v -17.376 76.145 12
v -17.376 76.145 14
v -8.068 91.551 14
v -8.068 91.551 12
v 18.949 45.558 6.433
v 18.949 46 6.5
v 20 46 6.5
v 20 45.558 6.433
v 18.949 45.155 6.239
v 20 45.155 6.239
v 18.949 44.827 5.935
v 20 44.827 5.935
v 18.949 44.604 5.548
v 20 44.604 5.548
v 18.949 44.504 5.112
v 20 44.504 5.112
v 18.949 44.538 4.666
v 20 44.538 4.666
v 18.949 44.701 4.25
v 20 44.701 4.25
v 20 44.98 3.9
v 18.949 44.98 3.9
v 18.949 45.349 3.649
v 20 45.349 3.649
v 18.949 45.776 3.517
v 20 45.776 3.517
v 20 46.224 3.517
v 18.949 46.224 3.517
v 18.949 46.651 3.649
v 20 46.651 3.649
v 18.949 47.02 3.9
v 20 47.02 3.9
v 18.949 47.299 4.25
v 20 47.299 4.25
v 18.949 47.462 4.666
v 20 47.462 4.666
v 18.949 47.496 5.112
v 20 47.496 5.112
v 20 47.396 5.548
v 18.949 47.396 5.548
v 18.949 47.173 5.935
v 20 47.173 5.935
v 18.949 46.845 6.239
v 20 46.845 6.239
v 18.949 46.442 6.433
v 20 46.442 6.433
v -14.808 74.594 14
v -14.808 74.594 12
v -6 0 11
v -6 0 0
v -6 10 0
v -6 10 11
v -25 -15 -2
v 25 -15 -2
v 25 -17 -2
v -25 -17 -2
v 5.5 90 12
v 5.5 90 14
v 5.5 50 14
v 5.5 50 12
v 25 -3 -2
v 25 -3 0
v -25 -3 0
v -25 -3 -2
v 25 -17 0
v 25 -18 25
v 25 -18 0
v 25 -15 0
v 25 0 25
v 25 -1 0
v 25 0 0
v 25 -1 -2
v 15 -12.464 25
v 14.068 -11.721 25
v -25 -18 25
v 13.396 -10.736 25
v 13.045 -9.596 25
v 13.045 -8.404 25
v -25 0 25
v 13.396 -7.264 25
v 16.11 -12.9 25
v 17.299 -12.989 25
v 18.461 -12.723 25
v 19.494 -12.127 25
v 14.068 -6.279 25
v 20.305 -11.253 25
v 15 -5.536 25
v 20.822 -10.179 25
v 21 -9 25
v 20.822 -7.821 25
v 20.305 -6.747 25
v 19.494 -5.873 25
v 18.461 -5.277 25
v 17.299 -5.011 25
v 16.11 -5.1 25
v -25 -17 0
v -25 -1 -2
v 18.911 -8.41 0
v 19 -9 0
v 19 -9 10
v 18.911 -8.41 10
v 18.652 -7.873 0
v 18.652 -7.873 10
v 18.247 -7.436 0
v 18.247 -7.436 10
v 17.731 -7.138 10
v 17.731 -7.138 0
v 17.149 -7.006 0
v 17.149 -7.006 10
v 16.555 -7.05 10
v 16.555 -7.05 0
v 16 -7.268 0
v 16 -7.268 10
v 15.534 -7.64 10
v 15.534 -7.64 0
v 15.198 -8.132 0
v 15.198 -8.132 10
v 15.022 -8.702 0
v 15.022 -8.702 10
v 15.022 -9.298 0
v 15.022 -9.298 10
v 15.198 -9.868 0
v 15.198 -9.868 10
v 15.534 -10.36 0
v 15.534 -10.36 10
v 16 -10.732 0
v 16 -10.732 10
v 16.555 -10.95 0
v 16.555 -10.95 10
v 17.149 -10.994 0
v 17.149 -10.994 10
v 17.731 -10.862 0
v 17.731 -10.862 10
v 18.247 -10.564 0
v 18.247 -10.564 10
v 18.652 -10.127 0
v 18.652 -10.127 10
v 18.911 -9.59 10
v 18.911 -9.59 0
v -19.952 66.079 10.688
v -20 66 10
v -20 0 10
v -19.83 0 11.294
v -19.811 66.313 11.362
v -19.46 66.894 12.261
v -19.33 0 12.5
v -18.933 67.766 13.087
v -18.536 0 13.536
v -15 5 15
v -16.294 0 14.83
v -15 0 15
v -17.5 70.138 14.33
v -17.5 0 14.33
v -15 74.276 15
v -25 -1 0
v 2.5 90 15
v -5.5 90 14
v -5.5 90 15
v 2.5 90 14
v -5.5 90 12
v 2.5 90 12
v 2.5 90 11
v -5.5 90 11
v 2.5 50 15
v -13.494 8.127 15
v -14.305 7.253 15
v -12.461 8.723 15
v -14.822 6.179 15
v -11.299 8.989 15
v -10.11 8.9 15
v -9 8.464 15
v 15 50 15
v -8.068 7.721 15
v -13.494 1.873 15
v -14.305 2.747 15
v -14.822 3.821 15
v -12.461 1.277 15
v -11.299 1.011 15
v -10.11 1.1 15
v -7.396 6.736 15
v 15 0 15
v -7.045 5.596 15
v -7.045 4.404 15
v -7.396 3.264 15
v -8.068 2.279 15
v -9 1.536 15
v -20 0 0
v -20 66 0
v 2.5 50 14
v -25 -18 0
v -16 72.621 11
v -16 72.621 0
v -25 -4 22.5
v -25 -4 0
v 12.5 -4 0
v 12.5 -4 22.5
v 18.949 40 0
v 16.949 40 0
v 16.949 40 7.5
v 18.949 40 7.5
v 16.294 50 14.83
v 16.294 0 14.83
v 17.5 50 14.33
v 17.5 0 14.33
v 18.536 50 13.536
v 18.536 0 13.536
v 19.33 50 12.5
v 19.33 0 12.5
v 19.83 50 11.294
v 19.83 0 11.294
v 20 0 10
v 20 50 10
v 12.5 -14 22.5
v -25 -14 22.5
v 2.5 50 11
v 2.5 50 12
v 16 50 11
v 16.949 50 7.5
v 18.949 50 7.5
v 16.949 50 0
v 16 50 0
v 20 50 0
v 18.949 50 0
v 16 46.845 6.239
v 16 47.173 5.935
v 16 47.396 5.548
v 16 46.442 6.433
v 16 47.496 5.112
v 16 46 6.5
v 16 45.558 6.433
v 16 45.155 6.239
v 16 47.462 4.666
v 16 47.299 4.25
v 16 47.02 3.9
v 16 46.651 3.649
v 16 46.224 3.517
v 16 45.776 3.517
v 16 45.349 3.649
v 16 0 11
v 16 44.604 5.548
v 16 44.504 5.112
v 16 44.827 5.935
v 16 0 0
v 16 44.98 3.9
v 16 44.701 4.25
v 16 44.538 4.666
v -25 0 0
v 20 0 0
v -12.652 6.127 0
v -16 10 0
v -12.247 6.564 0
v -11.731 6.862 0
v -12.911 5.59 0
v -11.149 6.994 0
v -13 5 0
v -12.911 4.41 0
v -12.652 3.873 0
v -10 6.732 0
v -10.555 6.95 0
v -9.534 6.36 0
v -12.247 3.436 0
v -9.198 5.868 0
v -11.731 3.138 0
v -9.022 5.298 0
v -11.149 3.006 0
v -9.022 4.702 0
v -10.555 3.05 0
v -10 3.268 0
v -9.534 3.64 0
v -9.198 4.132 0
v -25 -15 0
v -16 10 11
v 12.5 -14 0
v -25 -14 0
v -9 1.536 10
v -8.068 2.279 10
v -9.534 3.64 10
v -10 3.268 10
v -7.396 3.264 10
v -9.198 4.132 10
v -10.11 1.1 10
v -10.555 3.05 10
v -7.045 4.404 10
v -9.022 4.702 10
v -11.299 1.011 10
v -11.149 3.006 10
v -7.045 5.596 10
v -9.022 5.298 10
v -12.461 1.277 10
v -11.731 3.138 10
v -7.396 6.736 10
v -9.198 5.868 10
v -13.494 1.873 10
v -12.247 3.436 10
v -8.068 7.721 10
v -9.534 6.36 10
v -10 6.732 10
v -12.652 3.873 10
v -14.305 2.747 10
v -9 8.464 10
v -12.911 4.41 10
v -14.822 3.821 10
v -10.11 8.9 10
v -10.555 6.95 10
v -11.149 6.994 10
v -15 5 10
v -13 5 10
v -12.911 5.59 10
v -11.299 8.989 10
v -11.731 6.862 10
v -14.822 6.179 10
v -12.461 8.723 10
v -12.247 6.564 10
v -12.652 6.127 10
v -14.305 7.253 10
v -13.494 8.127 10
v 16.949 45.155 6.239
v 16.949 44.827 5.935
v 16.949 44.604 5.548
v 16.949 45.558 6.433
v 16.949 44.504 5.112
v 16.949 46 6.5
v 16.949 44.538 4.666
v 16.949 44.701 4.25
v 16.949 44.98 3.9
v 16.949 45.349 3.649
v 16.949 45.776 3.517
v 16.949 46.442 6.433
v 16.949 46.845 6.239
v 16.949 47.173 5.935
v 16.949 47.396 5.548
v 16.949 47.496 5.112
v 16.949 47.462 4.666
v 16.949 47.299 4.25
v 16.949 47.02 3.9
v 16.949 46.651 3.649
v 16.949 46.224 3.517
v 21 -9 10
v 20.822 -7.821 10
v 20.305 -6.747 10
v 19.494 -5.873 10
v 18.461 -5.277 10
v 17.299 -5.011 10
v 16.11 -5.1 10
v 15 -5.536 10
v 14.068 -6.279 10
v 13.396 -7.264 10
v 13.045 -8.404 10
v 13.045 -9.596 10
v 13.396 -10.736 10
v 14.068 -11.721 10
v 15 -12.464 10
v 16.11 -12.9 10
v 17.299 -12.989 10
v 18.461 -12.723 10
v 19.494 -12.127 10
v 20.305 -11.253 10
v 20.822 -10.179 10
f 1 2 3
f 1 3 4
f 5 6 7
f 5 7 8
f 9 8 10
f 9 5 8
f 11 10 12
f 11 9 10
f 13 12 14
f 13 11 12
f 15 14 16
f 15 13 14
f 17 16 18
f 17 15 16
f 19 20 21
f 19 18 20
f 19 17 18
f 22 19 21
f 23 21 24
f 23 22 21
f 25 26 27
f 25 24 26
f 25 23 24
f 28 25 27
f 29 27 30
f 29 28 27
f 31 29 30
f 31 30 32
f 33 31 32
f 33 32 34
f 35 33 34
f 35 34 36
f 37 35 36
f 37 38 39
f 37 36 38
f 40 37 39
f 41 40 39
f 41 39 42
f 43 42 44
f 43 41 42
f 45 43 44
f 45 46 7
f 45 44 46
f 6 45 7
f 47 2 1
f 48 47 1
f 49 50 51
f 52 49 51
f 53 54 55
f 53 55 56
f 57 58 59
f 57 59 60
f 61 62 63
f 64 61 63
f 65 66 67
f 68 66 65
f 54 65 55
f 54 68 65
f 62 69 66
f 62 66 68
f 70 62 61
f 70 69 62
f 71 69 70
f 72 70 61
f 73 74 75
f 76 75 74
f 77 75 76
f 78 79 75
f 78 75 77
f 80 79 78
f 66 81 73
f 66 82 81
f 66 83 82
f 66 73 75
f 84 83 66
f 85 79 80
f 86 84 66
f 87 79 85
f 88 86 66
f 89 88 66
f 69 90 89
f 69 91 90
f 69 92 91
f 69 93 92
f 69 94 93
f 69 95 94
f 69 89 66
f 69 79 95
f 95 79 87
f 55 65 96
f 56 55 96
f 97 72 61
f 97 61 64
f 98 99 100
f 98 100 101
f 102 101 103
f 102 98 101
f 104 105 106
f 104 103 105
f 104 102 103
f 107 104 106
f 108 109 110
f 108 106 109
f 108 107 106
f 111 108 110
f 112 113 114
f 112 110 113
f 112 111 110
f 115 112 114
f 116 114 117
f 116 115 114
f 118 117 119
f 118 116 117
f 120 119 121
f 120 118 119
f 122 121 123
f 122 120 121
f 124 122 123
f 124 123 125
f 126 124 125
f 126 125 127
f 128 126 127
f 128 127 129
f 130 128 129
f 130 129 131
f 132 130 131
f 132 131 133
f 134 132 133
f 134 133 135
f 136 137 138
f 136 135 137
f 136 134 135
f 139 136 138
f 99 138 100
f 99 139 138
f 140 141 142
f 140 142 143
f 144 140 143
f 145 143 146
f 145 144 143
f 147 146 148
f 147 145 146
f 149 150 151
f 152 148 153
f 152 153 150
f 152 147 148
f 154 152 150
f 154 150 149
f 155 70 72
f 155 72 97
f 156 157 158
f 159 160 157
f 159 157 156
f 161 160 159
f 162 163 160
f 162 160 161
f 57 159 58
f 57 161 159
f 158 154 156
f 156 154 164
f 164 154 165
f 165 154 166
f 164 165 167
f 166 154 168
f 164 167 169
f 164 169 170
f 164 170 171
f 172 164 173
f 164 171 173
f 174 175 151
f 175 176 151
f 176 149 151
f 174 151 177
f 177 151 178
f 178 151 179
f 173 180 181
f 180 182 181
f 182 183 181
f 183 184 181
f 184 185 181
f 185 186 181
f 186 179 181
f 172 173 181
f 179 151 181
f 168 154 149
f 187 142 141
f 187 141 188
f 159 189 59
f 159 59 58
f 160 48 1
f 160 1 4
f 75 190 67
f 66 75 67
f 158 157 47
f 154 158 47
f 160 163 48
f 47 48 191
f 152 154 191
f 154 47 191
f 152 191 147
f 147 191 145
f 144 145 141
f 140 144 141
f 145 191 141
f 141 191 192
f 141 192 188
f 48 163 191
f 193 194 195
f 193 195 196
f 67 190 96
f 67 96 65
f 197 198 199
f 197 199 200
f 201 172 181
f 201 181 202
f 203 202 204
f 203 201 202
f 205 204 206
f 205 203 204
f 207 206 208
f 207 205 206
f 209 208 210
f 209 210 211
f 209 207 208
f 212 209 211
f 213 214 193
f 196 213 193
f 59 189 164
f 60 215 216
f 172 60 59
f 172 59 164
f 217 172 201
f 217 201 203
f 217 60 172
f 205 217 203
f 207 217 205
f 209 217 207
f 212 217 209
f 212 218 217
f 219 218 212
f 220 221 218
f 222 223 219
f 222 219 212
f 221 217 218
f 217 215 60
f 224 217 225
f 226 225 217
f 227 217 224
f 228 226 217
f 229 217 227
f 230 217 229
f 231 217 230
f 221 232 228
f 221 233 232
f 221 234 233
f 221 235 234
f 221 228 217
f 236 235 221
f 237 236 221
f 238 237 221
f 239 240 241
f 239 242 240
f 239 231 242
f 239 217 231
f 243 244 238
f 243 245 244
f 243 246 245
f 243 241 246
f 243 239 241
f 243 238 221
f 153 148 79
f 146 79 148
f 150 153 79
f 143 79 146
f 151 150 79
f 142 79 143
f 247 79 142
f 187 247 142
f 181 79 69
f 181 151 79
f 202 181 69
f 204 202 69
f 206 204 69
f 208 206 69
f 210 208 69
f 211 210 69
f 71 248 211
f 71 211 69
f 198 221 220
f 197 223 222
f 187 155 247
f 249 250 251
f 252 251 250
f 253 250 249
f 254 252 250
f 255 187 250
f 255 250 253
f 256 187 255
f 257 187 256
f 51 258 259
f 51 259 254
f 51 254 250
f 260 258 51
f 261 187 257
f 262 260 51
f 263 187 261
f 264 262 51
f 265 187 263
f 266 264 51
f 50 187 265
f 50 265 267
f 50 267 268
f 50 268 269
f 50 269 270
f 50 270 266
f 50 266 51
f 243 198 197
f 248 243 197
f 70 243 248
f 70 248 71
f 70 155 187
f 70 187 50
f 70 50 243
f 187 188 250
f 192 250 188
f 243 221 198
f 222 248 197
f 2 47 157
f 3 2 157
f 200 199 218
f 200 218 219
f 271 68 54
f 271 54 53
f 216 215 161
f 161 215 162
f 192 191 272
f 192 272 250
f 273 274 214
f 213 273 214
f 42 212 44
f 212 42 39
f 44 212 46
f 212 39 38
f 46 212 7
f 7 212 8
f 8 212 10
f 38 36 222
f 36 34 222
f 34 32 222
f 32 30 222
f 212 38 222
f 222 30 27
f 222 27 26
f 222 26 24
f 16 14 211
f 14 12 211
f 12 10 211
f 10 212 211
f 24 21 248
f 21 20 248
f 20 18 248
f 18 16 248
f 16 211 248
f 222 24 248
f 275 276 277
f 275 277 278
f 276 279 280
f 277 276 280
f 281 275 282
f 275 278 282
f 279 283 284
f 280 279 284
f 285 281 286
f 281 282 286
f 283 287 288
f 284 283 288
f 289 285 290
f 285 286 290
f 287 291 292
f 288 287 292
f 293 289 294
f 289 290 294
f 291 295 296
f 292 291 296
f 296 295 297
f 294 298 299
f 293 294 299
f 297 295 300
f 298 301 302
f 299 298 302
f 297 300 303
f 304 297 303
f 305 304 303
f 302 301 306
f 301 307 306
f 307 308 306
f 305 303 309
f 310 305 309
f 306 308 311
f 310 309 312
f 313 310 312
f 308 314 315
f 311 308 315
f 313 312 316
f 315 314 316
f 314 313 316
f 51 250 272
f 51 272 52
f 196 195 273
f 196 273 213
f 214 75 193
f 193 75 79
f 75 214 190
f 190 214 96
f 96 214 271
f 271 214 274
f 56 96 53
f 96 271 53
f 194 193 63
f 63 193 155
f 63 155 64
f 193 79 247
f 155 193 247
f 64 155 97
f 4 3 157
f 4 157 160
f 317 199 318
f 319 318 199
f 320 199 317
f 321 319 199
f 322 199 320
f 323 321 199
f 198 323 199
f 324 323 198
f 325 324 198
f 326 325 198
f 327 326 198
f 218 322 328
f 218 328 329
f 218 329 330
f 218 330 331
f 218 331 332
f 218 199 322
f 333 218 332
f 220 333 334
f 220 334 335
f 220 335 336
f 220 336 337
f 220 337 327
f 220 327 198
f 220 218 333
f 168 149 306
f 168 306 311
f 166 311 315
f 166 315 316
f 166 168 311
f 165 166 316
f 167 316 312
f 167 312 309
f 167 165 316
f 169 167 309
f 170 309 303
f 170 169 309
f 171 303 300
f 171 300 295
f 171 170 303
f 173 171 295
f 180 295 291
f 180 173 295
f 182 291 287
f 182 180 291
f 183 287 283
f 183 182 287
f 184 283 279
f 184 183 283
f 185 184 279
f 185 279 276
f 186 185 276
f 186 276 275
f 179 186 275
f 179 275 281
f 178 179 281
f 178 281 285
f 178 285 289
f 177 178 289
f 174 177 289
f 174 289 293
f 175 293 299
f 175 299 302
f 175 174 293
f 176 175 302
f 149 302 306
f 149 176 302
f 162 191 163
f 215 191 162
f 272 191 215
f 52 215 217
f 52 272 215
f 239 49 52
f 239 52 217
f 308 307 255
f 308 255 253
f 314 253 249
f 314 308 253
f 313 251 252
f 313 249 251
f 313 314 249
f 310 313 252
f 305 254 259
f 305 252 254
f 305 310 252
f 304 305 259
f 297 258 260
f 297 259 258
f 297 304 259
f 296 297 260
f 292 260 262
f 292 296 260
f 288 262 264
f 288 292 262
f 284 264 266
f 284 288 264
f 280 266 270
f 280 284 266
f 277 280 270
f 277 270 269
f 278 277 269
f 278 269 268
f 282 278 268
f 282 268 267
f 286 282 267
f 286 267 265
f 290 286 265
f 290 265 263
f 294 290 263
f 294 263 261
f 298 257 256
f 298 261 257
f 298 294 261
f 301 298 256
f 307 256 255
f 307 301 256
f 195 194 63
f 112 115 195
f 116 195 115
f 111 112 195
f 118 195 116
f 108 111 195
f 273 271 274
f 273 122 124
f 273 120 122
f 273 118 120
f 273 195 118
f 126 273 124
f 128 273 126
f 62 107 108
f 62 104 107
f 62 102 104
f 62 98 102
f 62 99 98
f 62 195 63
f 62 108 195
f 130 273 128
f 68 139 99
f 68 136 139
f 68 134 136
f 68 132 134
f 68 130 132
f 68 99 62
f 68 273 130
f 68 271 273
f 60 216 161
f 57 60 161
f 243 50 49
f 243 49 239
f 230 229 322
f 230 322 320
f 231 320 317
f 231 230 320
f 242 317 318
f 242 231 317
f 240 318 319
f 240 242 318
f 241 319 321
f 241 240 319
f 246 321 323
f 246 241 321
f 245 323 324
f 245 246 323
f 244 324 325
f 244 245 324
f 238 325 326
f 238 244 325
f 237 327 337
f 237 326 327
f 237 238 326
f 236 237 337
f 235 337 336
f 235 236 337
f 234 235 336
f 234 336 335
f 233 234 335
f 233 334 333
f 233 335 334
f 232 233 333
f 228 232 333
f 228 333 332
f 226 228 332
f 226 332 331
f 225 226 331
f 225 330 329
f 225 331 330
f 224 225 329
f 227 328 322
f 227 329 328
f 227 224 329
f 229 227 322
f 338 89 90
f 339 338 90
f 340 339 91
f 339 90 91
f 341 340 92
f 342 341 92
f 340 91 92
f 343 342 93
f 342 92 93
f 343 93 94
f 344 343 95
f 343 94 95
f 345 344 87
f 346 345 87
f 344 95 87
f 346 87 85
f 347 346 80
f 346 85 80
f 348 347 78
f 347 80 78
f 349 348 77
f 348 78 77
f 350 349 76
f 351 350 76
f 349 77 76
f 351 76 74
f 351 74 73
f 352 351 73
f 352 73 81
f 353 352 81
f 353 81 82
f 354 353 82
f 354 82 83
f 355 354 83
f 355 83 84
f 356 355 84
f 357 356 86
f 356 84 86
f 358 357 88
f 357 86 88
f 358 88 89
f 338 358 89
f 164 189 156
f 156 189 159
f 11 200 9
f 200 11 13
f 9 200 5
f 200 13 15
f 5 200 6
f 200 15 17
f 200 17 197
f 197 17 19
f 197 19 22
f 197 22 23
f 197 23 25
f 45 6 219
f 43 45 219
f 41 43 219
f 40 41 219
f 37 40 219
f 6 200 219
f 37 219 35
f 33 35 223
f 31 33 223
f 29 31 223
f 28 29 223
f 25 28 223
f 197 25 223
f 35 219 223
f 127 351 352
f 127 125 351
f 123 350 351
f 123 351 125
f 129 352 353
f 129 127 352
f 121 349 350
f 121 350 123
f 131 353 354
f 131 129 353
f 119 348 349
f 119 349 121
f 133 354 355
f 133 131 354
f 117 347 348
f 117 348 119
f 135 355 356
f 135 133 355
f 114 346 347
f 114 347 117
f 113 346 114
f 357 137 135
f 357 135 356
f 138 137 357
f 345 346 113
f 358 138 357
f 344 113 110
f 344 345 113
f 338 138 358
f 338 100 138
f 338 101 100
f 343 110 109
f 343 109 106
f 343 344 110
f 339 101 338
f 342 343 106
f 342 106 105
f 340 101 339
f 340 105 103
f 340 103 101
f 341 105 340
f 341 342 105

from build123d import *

# Parameters (mm, degrees)
SKETCH1_W                = 40
SKETCH1_H                = 30
BOSS_EXTRUDE1_DEPTH      = 90
SHELL1_T                 = -4
FILLET1_R                = 5
CUT_EXTRUDE1_DEPTH       = 94.407708461
CUT_EXTRUDE1_DEPTH_BACK  = 94.407708461
CUT_EXTRUDE2_DEPTH       = 94.407708461
CUT_EXTRUDE2_DEPTH_BACK  = 94.407708461
SKETCH3_W                = 17.5
SKETCH3_H                = 40
SKETCH5_W                = 2
SKETCH5_H                = 40
BOSS_EXTRUDE2_DEPTH      = 3
SKETCH6_W                = 2
SKETCH6_H                = 18
BOSS_EXTRUDE3_DEPTH      = 3
SKETCH8_W                = 50
SKETCH8_H                = 50
BOSS_EXTRUDE4_DEPTH      = 18
SKETCH10_W               = 45
SKETCH10_H               = 10
CUT_EXTRUDE4_DEPTH       = 37.5
BOSS_EXTRUDE5_REACH      = 103.502
SKETCH15_W               = 10
SKETCH15_H               = 10
CUT_EXTRUDE8_DEPTH       = 103.988587343
CUT_EXTRUDE8_DEPTH_BACK  = 103.988587343
SKETCH20_R               = 2
SKETCH21_R               = 4
CUT_EXTRUDE9_DEPTH       = 5
SKETCH23_W               = 2
SKETCH23_H               = 15
CUT_EXTRUDE10_DEPTH      = 10
CUT_EXTRUDE11_START      = -10
SKETCH24_R               = 1.5
CUT_EXTRUDE11_DEPTH      = 116.031657717
CUT_EXTRUDE12_DEPTH      = 99.140965569
CUT_EXTRUDE12_DEPTH_BACK = 99.140965569
SKETCH27_W               = 50
SKETCH27_H               = 25
SKETCH29_W               = 50
SKETCH29_H               = 2
BOSS_EXTRUDE6_DEPTH      = 2
SKETCH30_W               = 50
SKETCH30_H               = 2
BOSS_EXTRUDE7_DEPTH      = 2
CUT_EXTRUDE13_DEPTH      = 99.66939304
CUT_EXTRUDE13_DEPTH_BACK = 99.66939304
SKETCH31_R               = 2
SKETCH32_R               = 4
CUT_EXTRUDE14_DEPTH      = 15


with BuildPart() as part:
    # Sketch1 → Boss-Extrude1 (new body)
    with BuildSketch(Plane(origin=(0, 0, 0), x_dir=(1, 0, 0), z_dir=(0, 1, 0))):
        Rectangle(SKETCH1_W, SKETCH1_H)
    extrude(amount=BOSS_EXTRUDE1_DEPTH)

    # Shell1
    shell1_openings = [part.faces().sort_by_distance(p)[0] for p in [
        (0, 90, 0),
        (0, 0, 0),
    ]]
    offset(amount=SHELL1_T, openings=shell1_openings, kind=Kind.INTERSECTION)

    # Fillet1
    fillet1_edges = [part.edges().sort_by_distance(p)[0] for p in [
        (20, 45, 15),
        (-20, 45, 15),
        (-20, 45, -15),
        (20, 45, -15),
    ]]
    fillet(fillet1_edges, radius=FILLET1_R)

    # Sketch2 → Cut-Extrude1 (cut, two sides: drawn at the far end of the back side and taken through both)
    with BuildSketch(Plane.XY.offset(-CUT_EXTRUDE1_DEPTH_BACK)):
        Polygon((-5.5, 90), (-20, 66), (-20, 90), align=None)
    extrude(amount=CUT_EXTRUDE1_DEPTH + CUT_EXTRUDE1_DEPTH_BACK, mode=Mode.SUBTRACT)

    # Sketch3 → Cut-Extrude2 (cut, two sides: drawn at the far end of the back side and taken through both)
    with BuildSketch(Plane.XY.offset(-CUT_EXTRUDE2_DEPTH_BACK)):
        with Locations((11.25, 70)):
            Rectangle(SKETCH3_W, SKETCH3_H)
    extrude(amount=CUT_EXTRUDE2_DEPTH + CUT_EXTRUDE2_DEPTH_BACK, mode=Mode.SUBTRACT)

    # Sketch5 → Boss-Extrude2 (add)
    with BuildSketch(Plane(origin=(2.5, 0, 0), x_dir=(0, 0, -1), z_dir=(1, 0, 0))):
        with Locations((-13, 70)):
            Rectangle(SKETCH5_W, SKETCH5_H)
    boss_extrude2 = extrude(amount=BOSS_EXTRUDE2_DEPTH)

    # Mirror1: Boss-Extrude2 across plane
    add(boss_extrude2.mirror(Plane.XY))

    # Sketch6 → Boss-Extrude3 (add)
    with BuildSketch(Plane(origin=(-43.86391097, 26.501112878, 0), x_dir=(0, 0, 1), z_dir=(-0.8559155419457906, 0.5171156399255814, 0))):
        with Locations((-13, 65.188262756)):
            Rectangle(SKETCH6_W, SKETCH6_H)
    boss_extrude3 = extrude(amount=BOSS_EXTRUDE3_DEPTH)

    # Mirror2: Boss-Extrude3 across plane
    add(boss_extrude3.mirror(Plane.XY))

    # Sketch8 → Boss-Extrude4 (add)
    with BuildSketch(Plane(origin=(0, 0, 0), x_dir=(1, 0, 0), z_dir=(0, 1, 0))):
        Rectangle(SKETCH8_W, SKETCH8_H)
    extrude(amount=-BOSS_EXTRUDE4_DEPTH)

    # Sketch10 → Cut-Extrude4 (cut)
    with BuildSketch(Plane.ZY.offset(25)):
        with Locations((0, -9)):
            Rectangle(SKETCH10_W, SKETCH10_H)
    extrude(amount=-CUT_EXTRUDE4_DEPTH, mode=Mode.SUBTRACT)

    # Sketch15 → Boss-Extrude5 (add, up to next)
    with BuildSketch(Plane.XY.offset(-11), mode=Mode.PRIVATE) as boss_extrude5_sk1:
        with Locations((-11, 5)):
            Rectangle(SKETCH15_W, SKETCH15_H)
    boss_extrude5_tool1 = extrude(boss_extrude5_sk1.sketch, amount=BOSS_EXTRUDE5_REACH, mode=Mode.PRIVATE) - part.part
    add(boss_extrude5_tool1.solids().sort_by_distance((-11, 5, -11))[0])

    # Sketch20 → Cut-Extrude8 (cut, two sides: drawn at the far end of the back side and taken through both)
    with BuildSketch(Plane(origin=(0, 0, -15), x_dir=(-1, 0, 0), z_dir=(0, 0, -1)).offset(-CUT_EXTRUDE8_DEPTH_BACK)):
        with Locations((11, 5)):
            Circle(SKETCH20_R)
    extrude(amount=CUT_EXTRUDE8_DEPTH + CUT_EXTRUDE8_DEPTH_BACK, mode=Mode.SUBTRACT)

    # Sketch21 → Cut-Extrude9 (cut)
    with BuildSketch(Plane(origin=(0, 0, -15), x_dir=(-1, 0, 0), z_dir=(0, 0, -1))):
        with Locations((11, 5)):
            Circle(SKETCH21_R)
    cut_extrude9 = extrude(amount=-CUT_EXTRUDE9_DEPTH, mode=Mode.SUBTRACT)

    # Mirror3: Cut-Extrude9 across plane
    add(cut_extrude9.mirror(Plane.XY), mode=Mode.SUBTRACT)

    # Sketch23 → Cut-Extrude10 (cut)
    with BuildSketch(Plane(origin=(0, 50, 0), x_dir=(1, 0, 0), z_dir=(0, 1, 0))):
        with Locations((17.949489743, 0)):
            Rectangle(SKETCH23_W, SKETCH23_H)
    extrude(amount=-CUT_EXTRUDE10_DEPTH, mode=Mode.SUBTRACT)

    # Sketch24 → Cut-Extrude11 (cut)
    with BuildSketch(Plane(origin=(20, 0, 0), x_dir=(0, 0, -1), z_dir=(1, 0, 0)).offset(CUT_EXTRUDE11_START)):
        with Locations(Location((-5, 46, 0), (0, 0, 180))):
            Circle(SKETCH24_R)
    cut_extrude11 = extrude(amount=CUT_EXTRUDE11_DEPTH, mode=Mode.SUBTRACT)

    # Mirror4: Cut-Extrude11 across plane
    add(cut_extrude11.mirror(Plane.XY), mode=Mode.SUBTRACT)

    # Sketch27 → Cut-Extrude12 (cut, two sides: drawn at the far end of the back side and taken through both)
    with BuildSketch(Plane(origin=(0, 0, 0), x_dir=(1, 0, 0), z_dir=(0, 1, 0)).offset(-CUT_EXTRUDE12_DEPTH_BACK)):
        with Locations((0, 12.5)):
            Rectangle(SKETCH27_W, SKETCH27_H)
    extrude(amount=CUT_EXTRUDE12_DEPTH + CUT_EXTRUDE12_DEPTH_BACK, mode=Mode.SUBTRACT)

    # Sketch29 → Boss-Extrude6 (add)
    with BuildSketch(Plane(origin=(0, 0, 0), x_dir=(-1, 0, 0), z_dir=(0, 0, -1))):
        with Locations((0, -2)):
            Rectangle(SKETCH29_W, SKETCH29_H)
    extrude(amount=BOSS_EXTRUDE6_DEPTH)

    # Sketch30 → Boss-Extrude7 (add)
    with BuildSketch(Plane(origin=(0, 0, 0), x_dir=(-1, 0, 0), z_dir=(0, 0, -1))):
        with Locations((0, -16)):
            Rectangle(SKETCH30_W, SKETCH30_H)
    extrude(amount=BOSS_EXTRUDE7_DEPTH)

    # Sketch31 → Cut-Extrude13 (cut, two sides: drawn at the far end of the back side and taken through both)
    with BuildSketch(Plane.XY.offset(25).offset(-CUT_EXTRUDE13_DEPTH_BACK)):
        with Locations((17, -9)):
            Circle(SKETCH31_R)
    extrude(amount=CUT_EXTRUDE13_DEPTH + CUT_EXTRUDE13_DEPTH_BACK, mode=Mode.SUBTRACT)

    # Sketch32 → Cut-Extrude14 (cut)
    with BuildSketch(Plane.XY.offset(25)):
        with Locations((17, -9)):
            Circle(SKETCH32_R)
    extrude(amount=-CUT_EXTRUDE14_DEPTH, mode=Mode.SUBTRACT)


solid = part.part
